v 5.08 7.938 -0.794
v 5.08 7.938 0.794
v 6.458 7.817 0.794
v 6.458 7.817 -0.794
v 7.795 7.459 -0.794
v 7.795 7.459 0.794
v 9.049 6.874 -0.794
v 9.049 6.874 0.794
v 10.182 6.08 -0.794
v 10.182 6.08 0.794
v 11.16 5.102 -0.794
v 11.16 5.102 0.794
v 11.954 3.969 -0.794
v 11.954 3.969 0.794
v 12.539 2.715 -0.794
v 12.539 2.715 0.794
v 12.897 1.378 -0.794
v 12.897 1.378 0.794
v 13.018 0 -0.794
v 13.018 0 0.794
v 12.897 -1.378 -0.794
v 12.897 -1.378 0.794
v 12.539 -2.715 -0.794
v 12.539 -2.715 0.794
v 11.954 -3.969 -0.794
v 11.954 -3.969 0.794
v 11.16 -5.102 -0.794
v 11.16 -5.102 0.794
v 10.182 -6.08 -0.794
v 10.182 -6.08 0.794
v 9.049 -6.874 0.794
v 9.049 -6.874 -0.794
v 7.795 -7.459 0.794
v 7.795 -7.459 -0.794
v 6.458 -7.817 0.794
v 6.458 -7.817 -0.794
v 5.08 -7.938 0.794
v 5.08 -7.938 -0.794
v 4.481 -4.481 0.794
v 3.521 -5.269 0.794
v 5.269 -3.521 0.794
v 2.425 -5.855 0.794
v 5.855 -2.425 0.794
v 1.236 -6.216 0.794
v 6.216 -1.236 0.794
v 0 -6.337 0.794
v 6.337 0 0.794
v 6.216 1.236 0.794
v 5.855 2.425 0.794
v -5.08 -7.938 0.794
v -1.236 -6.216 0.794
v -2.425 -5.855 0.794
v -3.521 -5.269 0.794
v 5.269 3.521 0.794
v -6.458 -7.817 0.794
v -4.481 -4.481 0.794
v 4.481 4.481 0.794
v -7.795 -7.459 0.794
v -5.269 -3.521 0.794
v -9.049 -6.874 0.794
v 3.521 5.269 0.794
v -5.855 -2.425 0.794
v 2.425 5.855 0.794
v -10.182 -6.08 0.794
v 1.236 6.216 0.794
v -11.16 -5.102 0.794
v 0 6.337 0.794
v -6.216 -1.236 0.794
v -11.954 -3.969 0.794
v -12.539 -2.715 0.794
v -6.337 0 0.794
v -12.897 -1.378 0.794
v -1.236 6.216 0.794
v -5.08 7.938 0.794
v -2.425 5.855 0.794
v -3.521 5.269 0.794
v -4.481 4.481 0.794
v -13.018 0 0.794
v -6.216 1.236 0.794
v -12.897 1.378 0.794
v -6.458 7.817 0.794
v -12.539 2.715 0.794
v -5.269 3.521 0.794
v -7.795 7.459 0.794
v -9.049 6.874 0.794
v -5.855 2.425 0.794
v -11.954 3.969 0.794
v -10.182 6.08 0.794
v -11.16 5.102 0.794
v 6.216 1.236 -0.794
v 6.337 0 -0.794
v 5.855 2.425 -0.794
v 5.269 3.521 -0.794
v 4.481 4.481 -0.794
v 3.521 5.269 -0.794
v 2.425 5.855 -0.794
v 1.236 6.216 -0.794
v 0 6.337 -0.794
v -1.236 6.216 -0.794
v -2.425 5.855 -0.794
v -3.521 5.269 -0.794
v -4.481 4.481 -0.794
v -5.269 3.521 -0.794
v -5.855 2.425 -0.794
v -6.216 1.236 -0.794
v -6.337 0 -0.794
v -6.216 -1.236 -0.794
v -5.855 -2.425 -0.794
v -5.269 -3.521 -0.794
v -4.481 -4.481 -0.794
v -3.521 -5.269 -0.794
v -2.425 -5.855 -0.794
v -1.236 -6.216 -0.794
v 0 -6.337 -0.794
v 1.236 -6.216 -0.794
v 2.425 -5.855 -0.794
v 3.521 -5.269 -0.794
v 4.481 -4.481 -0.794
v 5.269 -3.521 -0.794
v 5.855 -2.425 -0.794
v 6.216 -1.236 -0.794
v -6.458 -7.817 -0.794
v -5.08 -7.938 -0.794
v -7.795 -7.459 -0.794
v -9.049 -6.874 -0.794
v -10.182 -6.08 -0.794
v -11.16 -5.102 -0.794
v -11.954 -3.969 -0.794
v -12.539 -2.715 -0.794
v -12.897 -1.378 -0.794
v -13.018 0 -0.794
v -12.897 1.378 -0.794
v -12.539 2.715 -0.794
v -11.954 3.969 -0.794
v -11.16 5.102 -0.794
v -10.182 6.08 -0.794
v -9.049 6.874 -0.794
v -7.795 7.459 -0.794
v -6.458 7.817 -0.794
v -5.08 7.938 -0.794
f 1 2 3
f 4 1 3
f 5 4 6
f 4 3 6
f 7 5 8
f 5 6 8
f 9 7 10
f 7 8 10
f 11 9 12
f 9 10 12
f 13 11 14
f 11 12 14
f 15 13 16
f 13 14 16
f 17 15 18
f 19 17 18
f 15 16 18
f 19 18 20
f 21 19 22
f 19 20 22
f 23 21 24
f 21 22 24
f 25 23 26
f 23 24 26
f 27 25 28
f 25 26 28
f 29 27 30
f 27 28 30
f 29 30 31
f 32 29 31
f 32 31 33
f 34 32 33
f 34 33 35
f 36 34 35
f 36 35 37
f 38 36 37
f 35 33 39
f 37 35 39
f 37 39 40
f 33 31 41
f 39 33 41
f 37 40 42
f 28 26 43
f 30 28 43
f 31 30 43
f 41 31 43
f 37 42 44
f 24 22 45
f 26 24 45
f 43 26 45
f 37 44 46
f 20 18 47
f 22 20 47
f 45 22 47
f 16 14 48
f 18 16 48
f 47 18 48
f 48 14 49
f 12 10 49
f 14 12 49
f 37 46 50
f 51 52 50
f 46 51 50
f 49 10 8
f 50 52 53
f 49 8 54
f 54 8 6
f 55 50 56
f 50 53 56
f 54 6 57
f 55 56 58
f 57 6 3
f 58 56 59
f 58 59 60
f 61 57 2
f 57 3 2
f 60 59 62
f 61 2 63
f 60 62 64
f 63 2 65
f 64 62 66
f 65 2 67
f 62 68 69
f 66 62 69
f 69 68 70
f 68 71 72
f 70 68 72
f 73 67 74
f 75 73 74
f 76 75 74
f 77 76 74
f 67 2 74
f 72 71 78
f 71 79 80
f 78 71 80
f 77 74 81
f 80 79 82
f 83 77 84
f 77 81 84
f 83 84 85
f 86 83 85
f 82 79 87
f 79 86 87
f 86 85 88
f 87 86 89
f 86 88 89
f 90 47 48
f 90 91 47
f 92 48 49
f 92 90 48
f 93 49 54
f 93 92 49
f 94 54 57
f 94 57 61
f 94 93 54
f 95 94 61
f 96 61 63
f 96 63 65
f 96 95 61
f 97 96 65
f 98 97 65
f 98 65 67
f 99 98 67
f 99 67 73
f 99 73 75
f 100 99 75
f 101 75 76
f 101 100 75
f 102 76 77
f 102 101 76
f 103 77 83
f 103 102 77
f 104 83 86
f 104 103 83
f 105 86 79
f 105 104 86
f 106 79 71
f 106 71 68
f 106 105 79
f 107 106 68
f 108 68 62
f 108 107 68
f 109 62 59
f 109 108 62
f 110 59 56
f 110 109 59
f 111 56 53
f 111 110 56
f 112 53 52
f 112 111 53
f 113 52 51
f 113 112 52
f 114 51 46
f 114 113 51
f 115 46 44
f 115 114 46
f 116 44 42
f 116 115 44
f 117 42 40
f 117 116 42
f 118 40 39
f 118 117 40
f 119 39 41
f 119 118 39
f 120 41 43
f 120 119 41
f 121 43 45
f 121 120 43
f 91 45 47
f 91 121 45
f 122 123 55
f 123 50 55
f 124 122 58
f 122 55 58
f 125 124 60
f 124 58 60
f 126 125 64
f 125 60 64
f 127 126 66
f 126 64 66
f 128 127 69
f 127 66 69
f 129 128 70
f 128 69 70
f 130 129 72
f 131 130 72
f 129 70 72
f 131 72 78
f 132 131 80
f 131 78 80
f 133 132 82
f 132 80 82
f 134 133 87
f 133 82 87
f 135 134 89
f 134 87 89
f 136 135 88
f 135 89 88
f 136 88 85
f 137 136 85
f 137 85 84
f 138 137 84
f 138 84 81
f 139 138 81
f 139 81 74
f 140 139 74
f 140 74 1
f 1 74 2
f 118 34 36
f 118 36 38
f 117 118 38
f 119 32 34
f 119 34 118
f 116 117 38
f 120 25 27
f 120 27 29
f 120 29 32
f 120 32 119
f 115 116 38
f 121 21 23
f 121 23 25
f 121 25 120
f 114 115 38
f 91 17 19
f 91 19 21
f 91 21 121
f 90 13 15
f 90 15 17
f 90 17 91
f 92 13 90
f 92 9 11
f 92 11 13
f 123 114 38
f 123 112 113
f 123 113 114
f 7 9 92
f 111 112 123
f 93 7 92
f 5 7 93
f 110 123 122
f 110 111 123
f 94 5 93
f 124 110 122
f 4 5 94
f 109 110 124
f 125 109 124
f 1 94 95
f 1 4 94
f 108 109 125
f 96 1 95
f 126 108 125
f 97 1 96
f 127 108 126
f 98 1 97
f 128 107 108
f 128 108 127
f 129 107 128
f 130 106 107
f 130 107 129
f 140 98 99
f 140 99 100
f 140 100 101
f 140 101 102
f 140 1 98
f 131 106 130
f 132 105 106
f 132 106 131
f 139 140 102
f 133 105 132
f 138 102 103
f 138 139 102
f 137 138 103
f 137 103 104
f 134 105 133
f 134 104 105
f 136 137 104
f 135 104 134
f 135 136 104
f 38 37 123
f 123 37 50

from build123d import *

# Parameters (mm, degrees)
SKETCH1_R           = 6.3373
BOSS_EXTRUDE1_DEPTH = 0.79375


with BuildPart() as part:
    # Sketch1 → Boss-Extrude1 (new, symmetric)
    with BuildSketch(Plane.XY):
        with BuildLine():
            Line((5.08, -7.9375), (-5.08, -7.9375))
            ThreePointArc((-5.08, -7.9375), (-13.0175, 0), (-5.08, 7.9375))
            Line((-5.08, 7.9375), (5.08, 7.9375))
            ThreePointArc((5.08, 7.9375), (13.0175, 0), (5.08, -7.9375))
        make_face()
        Circle(SKETCH1_R, mode=Mode.SUBTRACT)
    extrude(amount=BOSS_EXTRUDE1_DEPTH, both=True)


solid = part.part
